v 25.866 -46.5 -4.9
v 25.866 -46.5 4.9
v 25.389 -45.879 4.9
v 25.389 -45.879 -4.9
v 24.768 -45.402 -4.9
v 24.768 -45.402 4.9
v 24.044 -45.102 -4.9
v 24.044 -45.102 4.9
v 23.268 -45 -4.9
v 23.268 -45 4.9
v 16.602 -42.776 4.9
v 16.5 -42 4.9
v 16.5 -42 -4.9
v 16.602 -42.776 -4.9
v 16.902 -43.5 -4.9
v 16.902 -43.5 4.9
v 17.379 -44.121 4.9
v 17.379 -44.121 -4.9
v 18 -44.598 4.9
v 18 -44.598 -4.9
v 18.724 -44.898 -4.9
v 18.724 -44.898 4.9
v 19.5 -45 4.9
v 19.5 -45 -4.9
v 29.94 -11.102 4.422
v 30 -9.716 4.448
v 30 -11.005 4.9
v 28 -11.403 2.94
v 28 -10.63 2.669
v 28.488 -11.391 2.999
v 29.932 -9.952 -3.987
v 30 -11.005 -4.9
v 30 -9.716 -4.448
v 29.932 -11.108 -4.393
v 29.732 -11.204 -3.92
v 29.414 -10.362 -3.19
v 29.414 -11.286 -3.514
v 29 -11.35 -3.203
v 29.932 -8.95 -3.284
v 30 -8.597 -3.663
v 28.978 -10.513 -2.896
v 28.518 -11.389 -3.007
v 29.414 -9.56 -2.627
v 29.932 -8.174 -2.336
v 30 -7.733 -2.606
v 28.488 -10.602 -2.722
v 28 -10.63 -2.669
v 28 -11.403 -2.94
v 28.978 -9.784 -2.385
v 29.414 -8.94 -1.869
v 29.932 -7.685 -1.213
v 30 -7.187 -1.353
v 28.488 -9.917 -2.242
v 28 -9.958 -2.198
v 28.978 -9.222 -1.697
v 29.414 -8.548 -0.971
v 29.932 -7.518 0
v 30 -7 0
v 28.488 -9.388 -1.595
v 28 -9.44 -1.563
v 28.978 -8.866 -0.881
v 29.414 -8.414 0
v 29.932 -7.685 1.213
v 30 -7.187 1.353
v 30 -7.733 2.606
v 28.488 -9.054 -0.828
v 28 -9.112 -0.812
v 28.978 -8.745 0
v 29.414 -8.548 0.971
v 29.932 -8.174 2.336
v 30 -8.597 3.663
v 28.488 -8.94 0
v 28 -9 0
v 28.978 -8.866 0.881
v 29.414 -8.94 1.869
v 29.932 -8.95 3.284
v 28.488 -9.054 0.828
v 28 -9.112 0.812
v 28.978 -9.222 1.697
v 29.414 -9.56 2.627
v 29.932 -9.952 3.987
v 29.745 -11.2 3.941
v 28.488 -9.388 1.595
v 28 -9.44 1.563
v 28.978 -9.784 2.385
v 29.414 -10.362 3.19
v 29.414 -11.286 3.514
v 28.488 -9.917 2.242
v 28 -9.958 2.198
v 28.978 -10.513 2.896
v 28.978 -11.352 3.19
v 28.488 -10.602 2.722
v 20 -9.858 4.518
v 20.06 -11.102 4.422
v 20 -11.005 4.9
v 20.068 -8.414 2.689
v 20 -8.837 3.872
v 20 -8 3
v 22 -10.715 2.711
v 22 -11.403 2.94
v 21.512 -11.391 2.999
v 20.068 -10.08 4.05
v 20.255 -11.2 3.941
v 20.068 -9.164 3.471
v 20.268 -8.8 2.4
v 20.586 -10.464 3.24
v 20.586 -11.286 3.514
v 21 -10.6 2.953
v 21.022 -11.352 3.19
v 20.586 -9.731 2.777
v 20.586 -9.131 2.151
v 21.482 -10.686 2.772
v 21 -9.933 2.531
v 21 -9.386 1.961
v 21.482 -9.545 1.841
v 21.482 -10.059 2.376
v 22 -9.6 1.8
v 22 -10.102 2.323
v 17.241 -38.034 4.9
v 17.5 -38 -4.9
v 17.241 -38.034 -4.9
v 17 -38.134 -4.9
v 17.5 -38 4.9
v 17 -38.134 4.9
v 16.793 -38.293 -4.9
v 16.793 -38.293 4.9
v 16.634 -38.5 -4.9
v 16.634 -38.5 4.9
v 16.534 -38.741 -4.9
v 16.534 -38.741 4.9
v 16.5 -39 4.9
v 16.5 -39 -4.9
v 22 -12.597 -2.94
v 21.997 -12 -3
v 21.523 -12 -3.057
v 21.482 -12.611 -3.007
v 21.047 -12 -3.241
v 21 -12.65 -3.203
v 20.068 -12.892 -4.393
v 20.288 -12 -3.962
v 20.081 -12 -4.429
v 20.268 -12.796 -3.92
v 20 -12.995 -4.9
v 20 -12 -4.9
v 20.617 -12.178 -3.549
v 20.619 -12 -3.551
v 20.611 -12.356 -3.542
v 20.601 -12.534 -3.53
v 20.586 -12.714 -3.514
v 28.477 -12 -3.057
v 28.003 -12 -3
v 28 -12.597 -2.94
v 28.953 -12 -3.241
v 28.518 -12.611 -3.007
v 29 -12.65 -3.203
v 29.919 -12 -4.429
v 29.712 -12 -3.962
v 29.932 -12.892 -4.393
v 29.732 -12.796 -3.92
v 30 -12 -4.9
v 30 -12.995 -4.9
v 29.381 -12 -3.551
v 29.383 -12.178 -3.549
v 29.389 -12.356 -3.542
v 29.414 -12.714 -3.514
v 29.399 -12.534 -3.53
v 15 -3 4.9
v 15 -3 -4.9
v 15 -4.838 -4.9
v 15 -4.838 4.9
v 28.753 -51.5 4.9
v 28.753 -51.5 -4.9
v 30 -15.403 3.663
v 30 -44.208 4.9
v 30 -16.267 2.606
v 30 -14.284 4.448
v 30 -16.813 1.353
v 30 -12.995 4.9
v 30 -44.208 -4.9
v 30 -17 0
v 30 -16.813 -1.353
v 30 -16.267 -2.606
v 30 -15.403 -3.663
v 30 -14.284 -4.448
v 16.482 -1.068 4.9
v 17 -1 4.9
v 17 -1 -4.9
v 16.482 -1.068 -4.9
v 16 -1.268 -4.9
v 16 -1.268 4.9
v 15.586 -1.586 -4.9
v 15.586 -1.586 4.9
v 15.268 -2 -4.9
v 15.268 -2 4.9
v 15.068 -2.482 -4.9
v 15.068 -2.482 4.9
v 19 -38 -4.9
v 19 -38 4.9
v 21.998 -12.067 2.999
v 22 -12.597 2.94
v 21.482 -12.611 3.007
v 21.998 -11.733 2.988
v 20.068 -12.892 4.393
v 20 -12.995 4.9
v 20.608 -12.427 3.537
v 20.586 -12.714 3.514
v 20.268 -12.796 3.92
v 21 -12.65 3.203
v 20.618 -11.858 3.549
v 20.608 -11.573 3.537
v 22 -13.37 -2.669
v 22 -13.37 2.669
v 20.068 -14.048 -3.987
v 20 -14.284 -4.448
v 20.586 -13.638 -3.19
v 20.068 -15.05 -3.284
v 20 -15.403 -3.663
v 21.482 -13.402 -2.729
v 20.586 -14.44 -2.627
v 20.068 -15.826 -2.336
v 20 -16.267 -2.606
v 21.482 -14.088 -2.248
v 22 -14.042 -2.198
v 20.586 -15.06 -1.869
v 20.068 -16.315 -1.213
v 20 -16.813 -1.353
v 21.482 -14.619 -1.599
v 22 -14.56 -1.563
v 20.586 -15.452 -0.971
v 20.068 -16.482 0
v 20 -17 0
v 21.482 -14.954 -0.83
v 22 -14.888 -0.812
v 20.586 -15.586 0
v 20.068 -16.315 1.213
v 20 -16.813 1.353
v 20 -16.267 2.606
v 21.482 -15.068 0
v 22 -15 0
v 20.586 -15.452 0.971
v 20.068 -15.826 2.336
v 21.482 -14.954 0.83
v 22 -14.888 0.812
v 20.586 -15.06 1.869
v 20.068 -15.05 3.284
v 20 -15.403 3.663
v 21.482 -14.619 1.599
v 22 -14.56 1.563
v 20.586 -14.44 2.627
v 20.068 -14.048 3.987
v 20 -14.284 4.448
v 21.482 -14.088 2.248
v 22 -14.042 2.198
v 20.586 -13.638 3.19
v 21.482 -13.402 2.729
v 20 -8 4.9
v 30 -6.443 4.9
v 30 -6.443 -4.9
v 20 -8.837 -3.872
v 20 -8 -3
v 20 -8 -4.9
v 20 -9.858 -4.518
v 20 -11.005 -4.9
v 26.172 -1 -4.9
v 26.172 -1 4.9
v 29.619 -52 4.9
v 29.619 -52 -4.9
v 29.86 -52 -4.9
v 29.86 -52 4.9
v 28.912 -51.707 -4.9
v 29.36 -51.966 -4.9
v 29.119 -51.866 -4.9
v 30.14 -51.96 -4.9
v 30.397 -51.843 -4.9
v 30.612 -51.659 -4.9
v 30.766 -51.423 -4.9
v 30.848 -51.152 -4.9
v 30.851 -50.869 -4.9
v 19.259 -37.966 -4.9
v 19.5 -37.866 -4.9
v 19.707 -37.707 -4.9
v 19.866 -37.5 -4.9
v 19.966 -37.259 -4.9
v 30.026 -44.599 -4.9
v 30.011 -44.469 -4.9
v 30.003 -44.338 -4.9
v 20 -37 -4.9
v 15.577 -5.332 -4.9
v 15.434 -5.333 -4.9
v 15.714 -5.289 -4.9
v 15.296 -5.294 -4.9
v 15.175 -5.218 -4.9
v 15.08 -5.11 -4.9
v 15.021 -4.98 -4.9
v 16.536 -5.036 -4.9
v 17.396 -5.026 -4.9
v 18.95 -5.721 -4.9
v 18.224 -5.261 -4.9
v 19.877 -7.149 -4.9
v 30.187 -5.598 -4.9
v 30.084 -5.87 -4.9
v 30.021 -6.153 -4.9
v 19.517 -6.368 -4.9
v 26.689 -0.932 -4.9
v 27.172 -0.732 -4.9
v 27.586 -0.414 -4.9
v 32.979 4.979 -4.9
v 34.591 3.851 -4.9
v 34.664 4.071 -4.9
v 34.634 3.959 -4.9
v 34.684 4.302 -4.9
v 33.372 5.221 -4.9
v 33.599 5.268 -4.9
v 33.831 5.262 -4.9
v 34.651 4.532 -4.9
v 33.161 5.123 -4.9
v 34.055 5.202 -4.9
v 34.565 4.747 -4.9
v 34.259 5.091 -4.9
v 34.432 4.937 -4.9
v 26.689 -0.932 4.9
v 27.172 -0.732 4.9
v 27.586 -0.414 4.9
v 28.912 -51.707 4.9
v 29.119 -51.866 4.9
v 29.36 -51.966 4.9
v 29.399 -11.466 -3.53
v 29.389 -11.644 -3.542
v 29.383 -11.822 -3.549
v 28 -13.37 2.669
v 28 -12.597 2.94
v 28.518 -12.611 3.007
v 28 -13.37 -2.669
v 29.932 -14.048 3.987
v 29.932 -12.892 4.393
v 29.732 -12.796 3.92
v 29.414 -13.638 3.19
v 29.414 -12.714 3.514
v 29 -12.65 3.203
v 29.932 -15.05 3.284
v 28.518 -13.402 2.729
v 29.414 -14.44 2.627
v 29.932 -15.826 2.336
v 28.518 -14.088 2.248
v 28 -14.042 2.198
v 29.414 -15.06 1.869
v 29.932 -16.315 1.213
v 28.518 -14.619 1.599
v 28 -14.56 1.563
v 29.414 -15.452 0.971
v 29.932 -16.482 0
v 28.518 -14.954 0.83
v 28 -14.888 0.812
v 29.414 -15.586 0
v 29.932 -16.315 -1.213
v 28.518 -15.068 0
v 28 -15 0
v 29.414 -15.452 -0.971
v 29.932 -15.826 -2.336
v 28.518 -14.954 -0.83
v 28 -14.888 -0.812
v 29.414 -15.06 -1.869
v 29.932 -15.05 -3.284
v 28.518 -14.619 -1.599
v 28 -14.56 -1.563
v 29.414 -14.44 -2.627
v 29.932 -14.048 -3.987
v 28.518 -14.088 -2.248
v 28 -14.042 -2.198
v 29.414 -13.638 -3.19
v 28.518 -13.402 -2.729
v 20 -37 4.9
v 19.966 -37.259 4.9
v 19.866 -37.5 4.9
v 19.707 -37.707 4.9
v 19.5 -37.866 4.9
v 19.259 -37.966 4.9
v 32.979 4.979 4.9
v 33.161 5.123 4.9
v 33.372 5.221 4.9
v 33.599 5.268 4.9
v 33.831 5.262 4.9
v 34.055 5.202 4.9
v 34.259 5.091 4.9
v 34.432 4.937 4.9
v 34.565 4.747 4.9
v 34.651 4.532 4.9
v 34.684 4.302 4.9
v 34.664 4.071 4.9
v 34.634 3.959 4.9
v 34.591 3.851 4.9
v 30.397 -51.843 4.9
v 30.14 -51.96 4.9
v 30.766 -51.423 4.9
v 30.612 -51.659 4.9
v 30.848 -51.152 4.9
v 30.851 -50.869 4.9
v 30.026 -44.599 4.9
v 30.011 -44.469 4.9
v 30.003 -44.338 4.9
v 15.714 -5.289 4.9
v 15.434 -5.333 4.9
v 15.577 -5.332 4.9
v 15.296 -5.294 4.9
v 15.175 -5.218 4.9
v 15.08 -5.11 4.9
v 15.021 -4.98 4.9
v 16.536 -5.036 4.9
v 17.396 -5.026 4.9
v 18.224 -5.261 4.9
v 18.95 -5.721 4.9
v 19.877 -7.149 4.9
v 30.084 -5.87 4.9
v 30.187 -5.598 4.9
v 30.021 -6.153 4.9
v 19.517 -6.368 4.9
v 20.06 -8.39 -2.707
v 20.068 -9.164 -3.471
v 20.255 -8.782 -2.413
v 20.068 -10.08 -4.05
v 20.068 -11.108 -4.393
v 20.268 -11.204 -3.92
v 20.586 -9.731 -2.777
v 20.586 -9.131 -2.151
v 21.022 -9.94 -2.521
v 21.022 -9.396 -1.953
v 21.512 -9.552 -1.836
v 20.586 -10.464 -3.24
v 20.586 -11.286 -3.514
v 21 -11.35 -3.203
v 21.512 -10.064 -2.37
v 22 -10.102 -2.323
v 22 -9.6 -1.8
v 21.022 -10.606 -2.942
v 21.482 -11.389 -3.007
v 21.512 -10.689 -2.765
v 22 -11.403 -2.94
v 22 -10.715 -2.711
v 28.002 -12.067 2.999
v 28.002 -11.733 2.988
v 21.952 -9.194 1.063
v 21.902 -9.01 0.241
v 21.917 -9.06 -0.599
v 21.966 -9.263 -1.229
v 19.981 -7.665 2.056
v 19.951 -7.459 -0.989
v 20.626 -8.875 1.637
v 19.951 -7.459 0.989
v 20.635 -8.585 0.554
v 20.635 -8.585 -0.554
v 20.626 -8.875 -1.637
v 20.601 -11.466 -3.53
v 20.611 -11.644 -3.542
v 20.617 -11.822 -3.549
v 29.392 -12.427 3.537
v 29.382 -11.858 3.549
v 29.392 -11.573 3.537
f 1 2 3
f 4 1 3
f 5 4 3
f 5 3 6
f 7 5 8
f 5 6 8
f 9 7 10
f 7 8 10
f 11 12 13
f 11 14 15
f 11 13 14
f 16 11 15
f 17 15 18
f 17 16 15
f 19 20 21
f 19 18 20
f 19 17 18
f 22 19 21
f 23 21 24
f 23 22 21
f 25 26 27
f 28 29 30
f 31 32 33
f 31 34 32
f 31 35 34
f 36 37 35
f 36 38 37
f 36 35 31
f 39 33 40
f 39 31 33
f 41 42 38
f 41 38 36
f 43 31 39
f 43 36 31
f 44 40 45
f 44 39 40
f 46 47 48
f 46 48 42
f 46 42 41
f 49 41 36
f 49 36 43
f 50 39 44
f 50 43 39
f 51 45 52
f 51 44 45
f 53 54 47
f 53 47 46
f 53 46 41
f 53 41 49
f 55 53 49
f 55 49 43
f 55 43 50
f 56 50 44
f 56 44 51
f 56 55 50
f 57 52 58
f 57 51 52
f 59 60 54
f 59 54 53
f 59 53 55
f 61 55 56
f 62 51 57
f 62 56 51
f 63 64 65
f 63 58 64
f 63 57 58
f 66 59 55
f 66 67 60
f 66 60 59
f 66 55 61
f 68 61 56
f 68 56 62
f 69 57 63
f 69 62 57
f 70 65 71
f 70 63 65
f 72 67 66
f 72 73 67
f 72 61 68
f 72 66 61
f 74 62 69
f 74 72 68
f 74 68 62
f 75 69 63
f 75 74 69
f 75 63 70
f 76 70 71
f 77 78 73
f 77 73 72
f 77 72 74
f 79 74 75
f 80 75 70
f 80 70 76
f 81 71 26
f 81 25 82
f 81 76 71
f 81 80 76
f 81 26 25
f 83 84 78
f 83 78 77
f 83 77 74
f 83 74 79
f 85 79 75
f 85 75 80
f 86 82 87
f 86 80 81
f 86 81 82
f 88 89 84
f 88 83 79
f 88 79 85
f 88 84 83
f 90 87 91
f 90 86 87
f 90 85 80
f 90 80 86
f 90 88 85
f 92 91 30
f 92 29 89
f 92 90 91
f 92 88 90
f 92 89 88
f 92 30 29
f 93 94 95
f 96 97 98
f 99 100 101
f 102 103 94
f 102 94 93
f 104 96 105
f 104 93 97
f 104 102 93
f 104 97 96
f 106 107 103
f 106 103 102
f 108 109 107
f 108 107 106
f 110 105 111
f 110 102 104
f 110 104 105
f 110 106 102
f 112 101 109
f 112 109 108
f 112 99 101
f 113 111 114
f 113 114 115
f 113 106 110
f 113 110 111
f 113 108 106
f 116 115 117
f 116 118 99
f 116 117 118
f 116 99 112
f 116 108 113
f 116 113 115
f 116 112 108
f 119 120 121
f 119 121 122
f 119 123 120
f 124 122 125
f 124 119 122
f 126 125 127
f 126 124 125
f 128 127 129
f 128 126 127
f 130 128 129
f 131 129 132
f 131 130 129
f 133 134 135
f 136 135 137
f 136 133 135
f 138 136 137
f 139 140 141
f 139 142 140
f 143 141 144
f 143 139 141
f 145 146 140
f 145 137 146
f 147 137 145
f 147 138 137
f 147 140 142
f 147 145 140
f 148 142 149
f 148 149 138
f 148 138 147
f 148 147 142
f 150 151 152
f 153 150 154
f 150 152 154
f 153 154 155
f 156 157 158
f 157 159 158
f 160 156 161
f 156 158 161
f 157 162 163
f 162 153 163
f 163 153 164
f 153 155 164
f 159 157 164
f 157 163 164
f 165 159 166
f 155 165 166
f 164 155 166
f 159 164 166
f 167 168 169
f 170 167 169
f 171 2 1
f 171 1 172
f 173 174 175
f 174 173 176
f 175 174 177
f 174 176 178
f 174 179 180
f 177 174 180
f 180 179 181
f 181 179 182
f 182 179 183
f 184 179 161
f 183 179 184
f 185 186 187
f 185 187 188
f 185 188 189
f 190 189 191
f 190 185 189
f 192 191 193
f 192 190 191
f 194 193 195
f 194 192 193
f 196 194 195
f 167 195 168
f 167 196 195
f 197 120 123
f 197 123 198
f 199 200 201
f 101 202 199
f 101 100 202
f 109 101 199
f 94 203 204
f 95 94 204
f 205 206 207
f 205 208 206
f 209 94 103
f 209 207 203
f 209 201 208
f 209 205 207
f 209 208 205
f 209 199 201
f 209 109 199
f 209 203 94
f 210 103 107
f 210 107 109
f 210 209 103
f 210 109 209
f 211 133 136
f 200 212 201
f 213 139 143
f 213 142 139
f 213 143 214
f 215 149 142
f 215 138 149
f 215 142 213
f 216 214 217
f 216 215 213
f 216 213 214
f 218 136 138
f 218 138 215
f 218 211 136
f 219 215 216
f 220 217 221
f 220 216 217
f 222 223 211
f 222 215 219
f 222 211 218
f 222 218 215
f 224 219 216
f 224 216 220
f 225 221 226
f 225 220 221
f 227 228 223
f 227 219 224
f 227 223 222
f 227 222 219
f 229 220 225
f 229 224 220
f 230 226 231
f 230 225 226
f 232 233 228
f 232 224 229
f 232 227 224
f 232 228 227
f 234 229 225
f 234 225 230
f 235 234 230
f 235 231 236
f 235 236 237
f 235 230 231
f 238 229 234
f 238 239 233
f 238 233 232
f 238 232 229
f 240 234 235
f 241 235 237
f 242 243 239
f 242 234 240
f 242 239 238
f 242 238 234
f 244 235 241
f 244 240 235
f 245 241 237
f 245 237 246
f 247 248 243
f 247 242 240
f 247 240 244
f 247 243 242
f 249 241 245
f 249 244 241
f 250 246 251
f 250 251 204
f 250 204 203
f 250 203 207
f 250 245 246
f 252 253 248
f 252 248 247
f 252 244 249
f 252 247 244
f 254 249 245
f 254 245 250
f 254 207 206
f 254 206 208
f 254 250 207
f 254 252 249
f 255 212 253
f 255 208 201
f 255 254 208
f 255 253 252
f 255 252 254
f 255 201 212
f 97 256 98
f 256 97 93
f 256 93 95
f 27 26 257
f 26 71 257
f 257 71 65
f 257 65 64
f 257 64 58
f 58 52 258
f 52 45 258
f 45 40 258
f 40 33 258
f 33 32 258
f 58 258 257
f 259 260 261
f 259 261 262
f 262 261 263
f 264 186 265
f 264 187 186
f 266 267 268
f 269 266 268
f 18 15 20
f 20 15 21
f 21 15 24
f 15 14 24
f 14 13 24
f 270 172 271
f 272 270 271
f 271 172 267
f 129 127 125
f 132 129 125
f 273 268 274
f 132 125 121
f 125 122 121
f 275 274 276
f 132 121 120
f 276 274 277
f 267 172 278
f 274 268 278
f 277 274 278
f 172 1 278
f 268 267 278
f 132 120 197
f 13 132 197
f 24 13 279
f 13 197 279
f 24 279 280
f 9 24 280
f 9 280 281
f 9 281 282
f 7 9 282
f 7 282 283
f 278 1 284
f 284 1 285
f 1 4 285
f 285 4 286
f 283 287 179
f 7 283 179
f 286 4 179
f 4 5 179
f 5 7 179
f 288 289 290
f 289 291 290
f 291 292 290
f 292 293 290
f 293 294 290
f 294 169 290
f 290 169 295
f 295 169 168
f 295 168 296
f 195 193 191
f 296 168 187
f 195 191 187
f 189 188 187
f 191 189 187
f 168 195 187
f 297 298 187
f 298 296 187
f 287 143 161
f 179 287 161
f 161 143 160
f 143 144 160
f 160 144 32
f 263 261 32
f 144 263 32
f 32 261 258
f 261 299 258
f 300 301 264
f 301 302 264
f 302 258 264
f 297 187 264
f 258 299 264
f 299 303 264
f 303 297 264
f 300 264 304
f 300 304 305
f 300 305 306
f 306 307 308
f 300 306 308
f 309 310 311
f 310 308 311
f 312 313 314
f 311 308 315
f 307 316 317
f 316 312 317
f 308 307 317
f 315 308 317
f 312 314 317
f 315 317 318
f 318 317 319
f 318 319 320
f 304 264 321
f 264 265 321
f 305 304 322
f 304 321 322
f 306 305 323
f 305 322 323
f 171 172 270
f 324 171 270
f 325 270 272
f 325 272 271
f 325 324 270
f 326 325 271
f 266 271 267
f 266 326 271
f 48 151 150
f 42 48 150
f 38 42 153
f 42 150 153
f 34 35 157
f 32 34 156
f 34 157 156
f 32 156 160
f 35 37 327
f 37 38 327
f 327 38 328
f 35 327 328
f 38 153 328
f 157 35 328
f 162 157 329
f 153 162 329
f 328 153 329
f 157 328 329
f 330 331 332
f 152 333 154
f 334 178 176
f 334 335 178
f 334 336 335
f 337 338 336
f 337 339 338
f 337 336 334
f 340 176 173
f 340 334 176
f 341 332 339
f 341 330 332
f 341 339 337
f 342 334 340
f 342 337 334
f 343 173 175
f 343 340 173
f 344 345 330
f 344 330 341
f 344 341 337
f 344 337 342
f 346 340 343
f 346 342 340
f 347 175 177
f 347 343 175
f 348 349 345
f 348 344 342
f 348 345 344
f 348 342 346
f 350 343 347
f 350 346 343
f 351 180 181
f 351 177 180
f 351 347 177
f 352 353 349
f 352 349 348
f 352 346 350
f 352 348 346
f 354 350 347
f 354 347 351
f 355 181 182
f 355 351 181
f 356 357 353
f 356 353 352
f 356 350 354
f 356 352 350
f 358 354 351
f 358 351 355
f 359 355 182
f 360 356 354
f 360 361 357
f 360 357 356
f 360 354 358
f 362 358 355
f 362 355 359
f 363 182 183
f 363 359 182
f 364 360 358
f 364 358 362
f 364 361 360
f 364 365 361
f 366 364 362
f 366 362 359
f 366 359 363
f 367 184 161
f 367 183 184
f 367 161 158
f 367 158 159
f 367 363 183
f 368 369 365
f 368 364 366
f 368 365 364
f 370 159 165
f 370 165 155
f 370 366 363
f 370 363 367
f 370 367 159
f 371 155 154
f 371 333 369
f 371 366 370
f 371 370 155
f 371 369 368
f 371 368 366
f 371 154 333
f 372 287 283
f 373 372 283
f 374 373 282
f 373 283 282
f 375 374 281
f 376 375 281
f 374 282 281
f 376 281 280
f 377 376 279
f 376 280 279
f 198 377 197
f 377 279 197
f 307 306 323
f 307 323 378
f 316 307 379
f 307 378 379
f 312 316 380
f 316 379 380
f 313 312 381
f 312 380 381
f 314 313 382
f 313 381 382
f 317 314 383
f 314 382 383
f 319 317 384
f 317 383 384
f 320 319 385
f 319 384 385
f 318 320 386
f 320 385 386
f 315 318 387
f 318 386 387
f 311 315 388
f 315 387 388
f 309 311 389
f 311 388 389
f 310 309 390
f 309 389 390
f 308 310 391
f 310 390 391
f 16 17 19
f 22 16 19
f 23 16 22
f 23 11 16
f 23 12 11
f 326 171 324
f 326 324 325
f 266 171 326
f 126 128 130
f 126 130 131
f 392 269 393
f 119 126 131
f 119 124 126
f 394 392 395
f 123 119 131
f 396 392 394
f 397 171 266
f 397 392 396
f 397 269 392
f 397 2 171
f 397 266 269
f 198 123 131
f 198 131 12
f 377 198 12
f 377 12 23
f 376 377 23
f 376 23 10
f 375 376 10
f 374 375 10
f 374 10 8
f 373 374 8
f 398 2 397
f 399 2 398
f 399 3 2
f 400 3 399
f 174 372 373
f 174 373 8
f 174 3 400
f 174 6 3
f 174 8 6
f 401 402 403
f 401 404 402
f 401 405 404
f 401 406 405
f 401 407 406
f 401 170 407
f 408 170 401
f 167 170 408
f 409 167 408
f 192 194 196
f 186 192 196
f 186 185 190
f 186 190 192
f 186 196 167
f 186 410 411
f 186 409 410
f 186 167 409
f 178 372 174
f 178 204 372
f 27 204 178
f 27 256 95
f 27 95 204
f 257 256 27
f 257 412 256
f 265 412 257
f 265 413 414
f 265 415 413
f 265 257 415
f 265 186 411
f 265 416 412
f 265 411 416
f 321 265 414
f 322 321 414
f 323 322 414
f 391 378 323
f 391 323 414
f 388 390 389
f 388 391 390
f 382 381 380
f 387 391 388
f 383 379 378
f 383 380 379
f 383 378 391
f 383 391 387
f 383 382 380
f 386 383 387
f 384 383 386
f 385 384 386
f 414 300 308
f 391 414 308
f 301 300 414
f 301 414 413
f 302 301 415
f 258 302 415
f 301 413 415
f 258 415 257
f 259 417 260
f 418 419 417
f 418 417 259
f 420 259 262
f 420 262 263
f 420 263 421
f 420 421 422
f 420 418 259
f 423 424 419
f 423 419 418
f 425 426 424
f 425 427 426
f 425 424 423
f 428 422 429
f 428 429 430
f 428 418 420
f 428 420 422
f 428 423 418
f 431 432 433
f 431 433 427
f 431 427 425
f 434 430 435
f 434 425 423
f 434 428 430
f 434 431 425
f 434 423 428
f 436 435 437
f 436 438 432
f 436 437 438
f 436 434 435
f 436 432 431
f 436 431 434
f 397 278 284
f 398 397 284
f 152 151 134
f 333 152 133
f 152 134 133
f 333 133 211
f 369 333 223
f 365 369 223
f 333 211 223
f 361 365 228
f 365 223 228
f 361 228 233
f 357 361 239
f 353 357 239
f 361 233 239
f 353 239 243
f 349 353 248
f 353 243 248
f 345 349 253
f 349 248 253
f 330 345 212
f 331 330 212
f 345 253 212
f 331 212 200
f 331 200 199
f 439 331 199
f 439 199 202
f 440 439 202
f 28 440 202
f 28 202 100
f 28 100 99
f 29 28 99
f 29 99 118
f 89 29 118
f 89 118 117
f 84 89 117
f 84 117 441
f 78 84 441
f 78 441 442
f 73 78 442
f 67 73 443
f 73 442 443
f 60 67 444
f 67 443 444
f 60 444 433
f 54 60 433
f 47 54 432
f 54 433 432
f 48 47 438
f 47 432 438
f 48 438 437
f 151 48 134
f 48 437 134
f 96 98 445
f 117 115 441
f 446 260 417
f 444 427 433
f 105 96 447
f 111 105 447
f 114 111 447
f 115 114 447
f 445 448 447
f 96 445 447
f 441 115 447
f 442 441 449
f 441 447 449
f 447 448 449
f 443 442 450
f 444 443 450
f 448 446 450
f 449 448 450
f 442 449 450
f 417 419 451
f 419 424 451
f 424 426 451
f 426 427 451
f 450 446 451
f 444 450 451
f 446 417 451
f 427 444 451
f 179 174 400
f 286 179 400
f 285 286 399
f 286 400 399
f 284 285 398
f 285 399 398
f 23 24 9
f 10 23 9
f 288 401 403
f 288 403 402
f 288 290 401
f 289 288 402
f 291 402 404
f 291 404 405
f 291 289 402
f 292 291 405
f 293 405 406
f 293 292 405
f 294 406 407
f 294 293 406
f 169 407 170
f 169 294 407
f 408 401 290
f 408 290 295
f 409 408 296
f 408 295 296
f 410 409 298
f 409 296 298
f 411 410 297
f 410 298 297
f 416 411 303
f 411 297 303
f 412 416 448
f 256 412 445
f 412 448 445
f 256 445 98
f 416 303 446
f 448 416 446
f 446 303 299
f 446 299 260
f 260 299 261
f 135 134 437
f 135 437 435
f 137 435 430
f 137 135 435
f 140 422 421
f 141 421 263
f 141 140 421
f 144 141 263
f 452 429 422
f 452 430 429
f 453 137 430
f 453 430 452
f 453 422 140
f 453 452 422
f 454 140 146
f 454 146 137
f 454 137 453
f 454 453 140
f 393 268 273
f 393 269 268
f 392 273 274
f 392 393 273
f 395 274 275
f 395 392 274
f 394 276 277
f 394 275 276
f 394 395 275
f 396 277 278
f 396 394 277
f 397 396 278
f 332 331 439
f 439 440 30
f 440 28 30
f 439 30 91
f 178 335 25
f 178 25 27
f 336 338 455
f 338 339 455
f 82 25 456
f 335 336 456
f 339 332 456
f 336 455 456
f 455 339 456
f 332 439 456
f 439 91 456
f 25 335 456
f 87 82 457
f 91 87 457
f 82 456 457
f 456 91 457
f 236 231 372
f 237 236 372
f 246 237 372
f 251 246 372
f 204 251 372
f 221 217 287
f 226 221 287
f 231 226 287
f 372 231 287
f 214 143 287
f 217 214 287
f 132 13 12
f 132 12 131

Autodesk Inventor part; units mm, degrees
ref_plane "YZ Plane" through (0, 0, 0) normal (1, 0, 0) x (0, 1, 0)
ref_plane "XZ Plane" through (0, 0, 0) normal (0, 1, 0) x (-1, 0, 0)
ref_plane "XY Plane" through (0, 0, 0) normal (0, 0, 1) x (1, 0, 0)
sketch "Sketch1" plane through (0, 0, 0) normal (0, 0, 1) x (1, 0, 0)
  line L0 (20, -22) -> (4.1, -22) construction
  line L1 (4.1, -22) -> (4.1, -25) construction
  line L2 (4.1, -25) -> (0, -25) construction
  line L3 (30, -47) -> (20, -47) construction
  circle A0 centre (17, -17) radius 3 construction
  line L4 (14, -17) -> (14, 0) construction
  line L5 (14, 0) -> (30, 0) construction
  line L6 (20, -47) -> (20, -17) construction
  line L7 (20, -47) -> (30, -47) construction
  line L8 (30, -47) -> (30, 0) construction
  line L9 (0, -25) -> (0, 0) construction
  line L10 (30, 0) -> (30, -47) construction
  line L11 (-7.0263, 0) -> (42.1581, 0) construction
  line L12 (0, -63.6142) -> (0, 17.6853) construction
  line L13 (17, -17) -> (17, -8) construction
  circle A1 centre (17, -8) radius 3 construction
  line L14 (16.5, -38) -> (20, -38)
  line L15 (16.5, -45) -> (25, -45)
  line L16 (25, -45) -> (29.0415, -52)
  line L17 (29.0415, -52) -> (31, -52)
  line L18 (31, -52) -> (30, -44.4042)
  line L19 (30, -44.4042) -> (30, -1)
  line L20 (15, -1) -> (30, -1)
  line L21 (15, -1) -> (15, -5.7639)
  line L22 (16.5, -45) -> (16.5, -38)
  arc A2 (20, -8) -> (15, -5.7639) centre (17, -8) ccw
  line L23 (20, -8) -> (20, -38)
  line L24 (27, -1) -> (34.0711, 6.0711)
  line L25 (34.0711, 6.0711) -> (35.1317, 5.0104)
  line L26 (30, -6) -> (35.1317, 5.0104)
  point P0 (0, 0)
  point P1 (0, 0)
  dimension "d10" = 6
  dimension "d1" = 3
  dimension "d2" = 5
  dimension "d3" = 14
  dimension "d4" = 20
  dimension "d5" = 22
  dimension "d6" = 30
  dimension "d7" = 4.1
  dimension "d8" = 3
  dimension "d9" = 25
  dimension "d11" = 9
  dimension "d12" = 0
  dimension "d13" = 16
  dimension "d14" = 7
  dimension "d15" = 3.5
  dimension "d16" = 120
  dimension "d17" = 7.5
  dimension "d19" = 5
  dimension "d20" = 5
  dimension "d21" = 1
  dimension "d22" = 1
  dimension "d23" = 1
  dimension "d40" = 45
  dimension "d41" = 3
  dimension "d42" = 10
  dimension "d43" = 5
  dimension "d46" = 1.5
extrude "Extrusion1" add sketch "Sketch1" along normal mid plane 9.8
fillet "Fillet1" radius 0.5 1 edges at (15, -5.7639, 0)
fillet "Fillet2" radius 1 2 edges at (29.0415, -52, 0) (31, -52, 0)
fillet "Fillet3" radius 3 3 edges at (16.5, -45, 0) (25, -45, 0) (30, -44.4042, 0)
fillet "Fillet4" radius 2 1 edges at (15, -1, 0)
fillet "Fillet5" radius 1 1 edges at (20, -38, 0)
sketch "Sketch2" plane through (30, -44.2076, 4.9) normal (1, 0, 0) x (0, 0, -1)
  line L0 (-1.96, 44.2076) -> (11.76, 44.2076) construction
  line L1 (4.9, -19.4066) -> (4.9, 61.8929) construction
  point P0 (4.9, 44.2076)
  point P1 (4.9, 32.2076)
  dimension "d44" = 12
hole "Hole1" at (30, -12, 0) direction (-1, 0, 0) diameter 6 end through all
fillet "Fillet6" radius 2 2 edges at (30, -12, 3) (20, -12, 3)
fillet "Fillet8" radius 1 2 edges at (34.0711, 6.0711, 0) (35.1317, 5.0104, 0)
fillet "Fillet9" radius 2 1 edges at (27, -1, 0)
fillet "Fillet10" radius 1 1 edges at (16.5, -38, 0)
fillet "Fillet11" radius 2 1 edges at (30, -6, 0)
properties part number "P104" material "ABS Plastic"
